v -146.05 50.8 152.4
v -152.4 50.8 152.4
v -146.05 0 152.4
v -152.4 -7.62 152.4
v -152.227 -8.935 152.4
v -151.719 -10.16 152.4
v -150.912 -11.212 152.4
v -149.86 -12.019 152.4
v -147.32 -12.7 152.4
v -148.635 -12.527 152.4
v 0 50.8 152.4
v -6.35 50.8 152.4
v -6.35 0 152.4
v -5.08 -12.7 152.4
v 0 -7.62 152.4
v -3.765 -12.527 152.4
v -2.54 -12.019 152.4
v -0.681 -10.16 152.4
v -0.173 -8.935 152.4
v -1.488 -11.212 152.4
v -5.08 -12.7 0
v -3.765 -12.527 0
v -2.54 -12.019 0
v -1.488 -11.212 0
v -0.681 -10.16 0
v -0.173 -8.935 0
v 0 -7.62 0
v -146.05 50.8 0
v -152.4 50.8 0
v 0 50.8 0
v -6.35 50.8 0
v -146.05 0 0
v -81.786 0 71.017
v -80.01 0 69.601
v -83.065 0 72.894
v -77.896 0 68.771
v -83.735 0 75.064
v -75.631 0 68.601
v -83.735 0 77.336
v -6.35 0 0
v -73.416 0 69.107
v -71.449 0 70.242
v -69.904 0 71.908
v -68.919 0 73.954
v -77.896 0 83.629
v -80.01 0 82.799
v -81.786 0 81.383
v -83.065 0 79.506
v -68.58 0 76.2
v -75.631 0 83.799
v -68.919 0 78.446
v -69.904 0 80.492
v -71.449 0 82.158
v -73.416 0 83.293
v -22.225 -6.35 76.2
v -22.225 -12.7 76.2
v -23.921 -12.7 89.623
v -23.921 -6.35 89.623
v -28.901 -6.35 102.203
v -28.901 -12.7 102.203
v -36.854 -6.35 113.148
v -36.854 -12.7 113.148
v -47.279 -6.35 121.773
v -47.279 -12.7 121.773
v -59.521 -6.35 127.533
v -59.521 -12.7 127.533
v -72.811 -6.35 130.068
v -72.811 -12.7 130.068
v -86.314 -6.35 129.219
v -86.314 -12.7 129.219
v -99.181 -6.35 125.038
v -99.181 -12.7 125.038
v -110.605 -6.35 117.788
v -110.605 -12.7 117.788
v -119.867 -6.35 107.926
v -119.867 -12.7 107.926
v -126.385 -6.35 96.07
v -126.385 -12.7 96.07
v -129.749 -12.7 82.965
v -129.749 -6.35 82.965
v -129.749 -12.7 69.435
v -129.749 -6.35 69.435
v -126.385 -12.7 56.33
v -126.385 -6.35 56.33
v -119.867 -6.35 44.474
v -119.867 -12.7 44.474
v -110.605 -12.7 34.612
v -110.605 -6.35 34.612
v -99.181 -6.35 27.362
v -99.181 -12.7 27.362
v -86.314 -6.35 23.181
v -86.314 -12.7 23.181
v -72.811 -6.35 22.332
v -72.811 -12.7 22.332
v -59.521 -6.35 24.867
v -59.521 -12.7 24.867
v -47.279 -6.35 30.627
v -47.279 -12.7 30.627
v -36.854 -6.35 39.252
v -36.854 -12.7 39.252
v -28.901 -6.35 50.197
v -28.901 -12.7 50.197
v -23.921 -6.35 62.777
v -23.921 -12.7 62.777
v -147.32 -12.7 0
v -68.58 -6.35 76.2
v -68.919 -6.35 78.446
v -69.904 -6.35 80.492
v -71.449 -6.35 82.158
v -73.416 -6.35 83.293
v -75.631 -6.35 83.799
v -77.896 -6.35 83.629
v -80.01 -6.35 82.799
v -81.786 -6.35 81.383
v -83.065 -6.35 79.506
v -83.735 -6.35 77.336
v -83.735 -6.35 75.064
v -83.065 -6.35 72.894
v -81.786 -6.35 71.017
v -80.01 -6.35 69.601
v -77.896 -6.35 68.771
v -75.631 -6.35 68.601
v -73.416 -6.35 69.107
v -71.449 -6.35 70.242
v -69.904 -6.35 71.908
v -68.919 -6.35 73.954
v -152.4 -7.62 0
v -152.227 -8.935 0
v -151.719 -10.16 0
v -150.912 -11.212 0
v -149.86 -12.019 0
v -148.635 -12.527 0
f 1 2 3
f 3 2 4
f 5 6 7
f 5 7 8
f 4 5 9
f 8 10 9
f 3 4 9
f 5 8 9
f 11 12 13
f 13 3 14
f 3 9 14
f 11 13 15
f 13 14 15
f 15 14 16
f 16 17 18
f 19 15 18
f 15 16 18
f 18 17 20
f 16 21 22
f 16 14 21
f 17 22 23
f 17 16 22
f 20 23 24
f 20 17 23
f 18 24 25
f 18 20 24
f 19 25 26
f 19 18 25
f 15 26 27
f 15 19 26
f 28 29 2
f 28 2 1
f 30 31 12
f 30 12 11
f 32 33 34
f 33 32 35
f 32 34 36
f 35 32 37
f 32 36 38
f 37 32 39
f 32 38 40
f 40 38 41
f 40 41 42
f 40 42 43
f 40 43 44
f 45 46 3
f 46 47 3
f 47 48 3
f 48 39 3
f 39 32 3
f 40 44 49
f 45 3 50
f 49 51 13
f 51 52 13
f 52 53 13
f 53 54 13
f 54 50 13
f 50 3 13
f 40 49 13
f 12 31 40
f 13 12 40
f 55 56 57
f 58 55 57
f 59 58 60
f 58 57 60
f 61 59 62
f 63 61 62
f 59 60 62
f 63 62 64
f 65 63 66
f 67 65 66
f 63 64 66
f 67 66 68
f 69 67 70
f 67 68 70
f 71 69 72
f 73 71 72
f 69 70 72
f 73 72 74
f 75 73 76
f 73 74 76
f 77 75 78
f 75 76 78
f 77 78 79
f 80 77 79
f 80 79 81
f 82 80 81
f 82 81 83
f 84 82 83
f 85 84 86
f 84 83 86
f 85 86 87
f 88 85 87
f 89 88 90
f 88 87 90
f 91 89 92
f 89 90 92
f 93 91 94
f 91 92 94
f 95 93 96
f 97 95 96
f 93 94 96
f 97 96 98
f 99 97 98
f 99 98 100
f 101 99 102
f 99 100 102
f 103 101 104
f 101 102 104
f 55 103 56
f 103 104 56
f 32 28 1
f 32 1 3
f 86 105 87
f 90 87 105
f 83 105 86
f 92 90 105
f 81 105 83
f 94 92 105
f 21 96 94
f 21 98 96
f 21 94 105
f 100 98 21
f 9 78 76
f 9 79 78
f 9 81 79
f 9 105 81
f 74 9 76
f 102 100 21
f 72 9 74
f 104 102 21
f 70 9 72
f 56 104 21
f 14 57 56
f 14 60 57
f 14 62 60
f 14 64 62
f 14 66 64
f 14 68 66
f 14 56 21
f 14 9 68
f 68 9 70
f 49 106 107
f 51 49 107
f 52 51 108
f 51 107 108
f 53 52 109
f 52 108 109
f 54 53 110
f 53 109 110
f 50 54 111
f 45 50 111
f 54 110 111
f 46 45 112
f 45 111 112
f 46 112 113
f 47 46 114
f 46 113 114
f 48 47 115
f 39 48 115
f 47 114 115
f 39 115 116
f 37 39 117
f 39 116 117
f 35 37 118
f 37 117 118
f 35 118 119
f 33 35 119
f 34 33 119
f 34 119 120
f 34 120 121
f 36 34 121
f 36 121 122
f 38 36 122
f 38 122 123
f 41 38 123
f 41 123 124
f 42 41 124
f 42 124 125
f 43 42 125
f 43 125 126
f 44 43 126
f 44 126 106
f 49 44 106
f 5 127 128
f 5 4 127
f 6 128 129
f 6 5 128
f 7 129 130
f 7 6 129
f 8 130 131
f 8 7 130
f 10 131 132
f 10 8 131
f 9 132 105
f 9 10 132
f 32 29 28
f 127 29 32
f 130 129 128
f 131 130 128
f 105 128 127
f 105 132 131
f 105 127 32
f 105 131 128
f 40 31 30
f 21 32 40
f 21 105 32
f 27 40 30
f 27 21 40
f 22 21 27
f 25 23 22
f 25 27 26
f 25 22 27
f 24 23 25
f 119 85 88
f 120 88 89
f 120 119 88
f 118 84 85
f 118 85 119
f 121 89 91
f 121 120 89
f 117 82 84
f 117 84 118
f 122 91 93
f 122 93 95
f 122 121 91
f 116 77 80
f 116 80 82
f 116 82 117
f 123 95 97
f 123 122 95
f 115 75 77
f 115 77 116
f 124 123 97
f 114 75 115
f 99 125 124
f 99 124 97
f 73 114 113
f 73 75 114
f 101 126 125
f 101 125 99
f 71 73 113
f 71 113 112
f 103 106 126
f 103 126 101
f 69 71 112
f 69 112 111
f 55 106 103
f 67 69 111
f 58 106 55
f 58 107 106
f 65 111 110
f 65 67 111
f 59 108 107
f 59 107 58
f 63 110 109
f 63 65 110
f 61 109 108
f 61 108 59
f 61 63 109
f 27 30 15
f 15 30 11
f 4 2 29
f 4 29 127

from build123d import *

# Parameters (mm, degrees)
F0_W     = 152.4
F0_H     = 152.4
F1_DEPTH = 12.7
F2_R     = 53.975
F3_DEPTH = 6.35
F4_W     = 6.35
F4_H     = 50.8
F5_DEPTH = 152.4
F6_R     = 7.62
F7_DEPTH = 25.4
F8_R     = 5.08
F9_R     = 5.08


with BuildPart() as f1:
    # F0 (on Front) → F1 (new body)
    with BuildSketch(Plane.XZ):
        with Locations((-76.2, 76.2)):
            Rectangle(F0_W, F0_H)
    extrude(amount=F1_DEPTH)

    # F2 (on face) → F3 (cut)
    with BuildSketch(Plane.XZ.offset(12.7)):
        with Locations((-76.2, 76.2)):
            Circle(F2_R)
    extrude(amount=-F3_DEPTH, mode=Mode.SUBTRACT)

    # F4 (on face) → F5 (join)
    with BuildSketch(Plane(origin=(0, 0, 0), x_dir=(1, 0, 0), z_dir=(0, 0, -1))):
        with Locations((-149.225, -25.4)):
            Rectangle(F4_W, F4_H)
        with Locations((-3.175, -25.4)):
            Rectangle(F4_W, F4_H)
    extrude(amount=-F5_DEPTH)

    # F6 (on face) → F7 (cut)
    with BuildSketch(Plane.XZ.offset(6.35)):
        with Locations((-76.2, 76.2)):
            Circle(F6_R)
    extrude(amount=-F7_DEPTH, mode=Mode.SUBTRACT)

    # F8
    f8_edges = [f1.edges().sort_by_distance(p)[0] for p in [
        (-152.4, -12.7, 76.2),
    ]]
    fillet(f8_edges, radius=F8_R)

    # F9
    f9_edges = [f1.edges().sort_by_distance(p)[0] for p in [
        (0, -12.7, 76.2),
    ]]
    fillet(f9_edges, radius=F9_R)


solid = f1.part
